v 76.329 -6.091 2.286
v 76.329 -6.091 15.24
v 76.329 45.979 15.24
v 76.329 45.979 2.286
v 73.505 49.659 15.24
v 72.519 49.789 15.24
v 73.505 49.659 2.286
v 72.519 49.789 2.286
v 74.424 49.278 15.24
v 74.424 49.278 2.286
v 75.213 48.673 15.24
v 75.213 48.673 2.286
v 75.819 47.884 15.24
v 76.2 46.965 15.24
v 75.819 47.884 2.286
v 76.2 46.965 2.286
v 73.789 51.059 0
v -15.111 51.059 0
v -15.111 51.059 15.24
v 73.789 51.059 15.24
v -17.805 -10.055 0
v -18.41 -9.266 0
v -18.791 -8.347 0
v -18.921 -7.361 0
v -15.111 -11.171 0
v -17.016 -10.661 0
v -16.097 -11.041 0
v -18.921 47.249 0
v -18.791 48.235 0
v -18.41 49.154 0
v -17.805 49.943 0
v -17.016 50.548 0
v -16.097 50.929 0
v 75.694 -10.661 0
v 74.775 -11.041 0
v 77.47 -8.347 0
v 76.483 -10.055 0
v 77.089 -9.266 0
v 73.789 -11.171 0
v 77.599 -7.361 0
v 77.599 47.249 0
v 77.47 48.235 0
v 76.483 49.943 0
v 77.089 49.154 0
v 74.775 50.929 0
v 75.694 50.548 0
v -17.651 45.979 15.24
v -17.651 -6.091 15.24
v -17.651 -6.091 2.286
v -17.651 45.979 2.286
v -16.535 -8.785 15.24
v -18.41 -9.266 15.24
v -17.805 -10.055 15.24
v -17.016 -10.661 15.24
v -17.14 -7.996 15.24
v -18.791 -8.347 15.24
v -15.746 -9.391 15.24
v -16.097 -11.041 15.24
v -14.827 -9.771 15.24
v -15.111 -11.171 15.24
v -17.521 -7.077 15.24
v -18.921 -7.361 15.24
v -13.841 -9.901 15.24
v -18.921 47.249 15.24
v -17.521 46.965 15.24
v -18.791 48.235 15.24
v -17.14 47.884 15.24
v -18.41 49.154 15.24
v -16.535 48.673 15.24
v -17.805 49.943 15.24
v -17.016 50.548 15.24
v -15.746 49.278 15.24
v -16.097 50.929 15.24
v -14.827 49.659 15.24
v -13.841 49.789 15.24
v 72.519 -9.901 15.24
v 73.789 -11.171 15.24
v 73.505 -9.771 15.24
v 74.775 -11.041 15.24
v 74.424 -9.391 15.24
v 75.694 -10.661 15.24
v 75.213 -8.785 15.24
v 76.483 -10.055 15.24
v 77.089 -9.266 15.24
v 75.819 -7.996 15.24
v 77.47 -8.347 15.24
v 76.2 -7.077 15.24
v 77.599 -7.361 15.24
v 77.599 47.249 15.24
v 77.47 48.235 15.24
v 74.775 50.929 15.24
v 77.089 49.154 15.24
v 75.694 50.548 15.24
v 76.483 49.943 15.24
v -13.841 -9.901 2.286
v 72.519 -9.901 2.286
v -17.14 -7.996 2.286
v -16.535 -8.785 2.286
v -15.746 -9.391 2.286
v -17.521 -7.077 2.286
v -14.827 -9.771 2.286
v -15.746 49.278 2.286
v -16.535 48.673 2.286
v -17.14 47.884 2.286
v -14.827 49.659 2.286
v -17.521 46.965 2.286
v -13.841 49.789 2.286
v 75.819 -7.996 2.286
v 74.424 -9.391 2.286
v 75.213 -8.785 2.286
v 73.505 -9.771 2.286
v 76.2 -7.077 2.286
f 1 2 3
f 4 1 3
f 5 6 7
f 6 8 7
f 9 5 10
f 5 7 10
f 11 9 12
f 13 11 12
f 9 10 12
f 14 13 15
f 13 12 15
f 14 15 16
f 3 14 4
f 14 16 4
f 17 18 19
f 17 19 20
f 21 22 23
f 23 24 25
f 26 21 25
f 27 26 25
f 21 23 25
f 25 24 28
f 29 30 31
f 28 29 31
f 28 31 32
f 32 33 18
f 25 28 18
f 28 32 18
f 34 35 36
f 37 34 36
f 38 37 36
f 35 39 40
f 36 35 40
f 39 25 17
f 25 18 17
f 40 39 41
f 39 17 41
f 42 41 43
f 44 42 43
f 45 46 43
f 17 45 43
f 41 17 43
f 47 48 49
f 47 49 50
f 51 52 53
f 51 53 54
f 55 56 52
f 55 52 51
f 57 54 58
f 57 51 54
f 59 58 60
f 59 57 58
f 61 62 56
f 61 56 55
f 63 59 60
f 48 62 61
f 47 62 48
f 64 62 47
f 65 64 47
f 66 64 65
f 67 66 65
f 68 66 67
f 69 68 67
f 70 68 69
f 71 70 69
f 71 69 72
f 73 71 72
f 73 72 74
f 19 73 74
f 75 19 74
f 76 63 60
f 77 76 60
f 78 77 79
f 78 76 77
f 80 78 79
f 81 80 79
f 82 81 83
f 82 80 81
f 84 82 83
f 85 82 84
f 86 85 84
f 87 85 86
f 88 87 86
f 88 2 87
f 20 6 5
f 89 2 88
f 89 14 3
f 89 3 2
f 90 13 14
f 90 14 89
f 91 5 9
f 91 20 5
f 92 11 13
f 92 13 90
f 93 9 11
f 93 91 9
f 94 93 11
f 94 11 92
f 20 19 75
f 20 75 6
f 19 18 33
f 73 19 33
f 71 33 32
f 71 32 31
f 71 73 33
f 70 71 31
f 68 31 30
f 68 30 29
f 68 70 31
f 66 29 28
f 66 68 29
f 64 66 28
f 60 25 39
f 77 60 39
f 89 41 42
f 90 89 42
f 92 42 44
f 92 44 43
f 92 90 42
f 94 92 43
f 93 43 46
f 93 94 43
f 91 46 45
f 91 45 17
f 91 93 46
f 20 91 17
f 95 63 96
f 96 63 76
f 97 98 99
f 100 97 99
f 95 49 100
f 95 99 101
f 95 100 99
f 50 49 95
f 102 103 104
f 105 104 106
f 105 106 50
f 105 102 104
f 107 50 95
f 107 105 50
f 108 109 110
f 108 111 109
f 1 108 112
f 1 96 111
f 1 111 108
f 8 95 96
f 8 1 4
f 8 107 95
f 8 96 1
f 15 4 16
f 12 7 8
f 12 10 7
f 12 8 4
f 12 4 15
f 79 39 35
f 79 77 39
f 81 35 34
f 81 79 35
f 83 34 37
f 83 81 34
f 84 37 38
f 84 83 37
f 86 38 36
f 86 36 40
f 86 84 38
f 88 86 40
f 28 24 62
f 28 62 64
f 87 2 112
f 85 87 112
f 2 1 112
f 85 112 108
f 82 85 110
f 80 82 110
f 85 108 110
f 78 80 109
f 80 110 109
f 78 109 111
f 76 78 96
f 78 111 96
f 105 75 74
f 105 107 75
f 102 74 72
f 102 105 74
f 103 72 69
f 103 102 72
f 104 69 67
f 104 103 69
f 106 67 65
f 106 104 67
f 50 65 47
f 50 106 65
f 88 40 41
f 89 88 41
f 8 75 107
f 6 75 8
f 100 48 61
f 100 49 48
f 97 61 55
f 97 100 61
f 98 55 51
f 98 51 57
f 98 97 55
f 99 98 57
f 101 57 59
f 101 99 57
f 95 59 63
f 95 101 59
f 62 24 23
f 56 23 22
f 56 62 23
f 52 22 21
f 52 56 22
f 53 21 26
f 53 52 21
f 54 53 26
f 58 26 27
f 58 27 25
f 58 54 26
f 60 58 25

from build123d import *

# Parameters (mm, degrees)
F0_W     = 96.52
F0_H     = 62.23
F1_DEPTH = 15.24
F2_R     = 3.81
F3_R     = 3.81
F4_R     = 3.81
F5_R     = 3.81
F6_W     = 93.98
F6_H     = 59.69
F7_DEPTH = 12.954
F8_R     = 3.81
F9_R     = 3.81


with BuildPart() as f1:
    # F0 (on Top) → F1 (new body)
    with BuildSketch(Plane.XY):
        with Locations((29.339396, 19.943792)):
            Rectangle(F0_W, F0_H)
    extrude(amount=F1_DEPTH)

    # F2
    f2_edges = [f1.edges().sort_by_distance(p)[0] for p in [
        (-18.920604, -11.171208, 7.62),
    ]]
    fillet(f2_edges, radius=F2_R)

    # F3
    f3_edges = [f1.edges().sort_by_distance(p)[0] for p in [
        (77.599396, -11.171208, 7.62),
    ]]
    fillet(f3_edges, radius=F3_R)

    # F4
    f4_edges = [f1.edges().sort_by_distance(p)[0] for p in [
        (77.599396, 51.058792, 7.62),
    ]]
    fillet(f4_edges, radius=F4_R)

    # F5
    f5_edges = [f1.edges().sort_by_distance(p)[0] for p in [
        (-18.920604, 51.058792, 7.62),
    ]]
    fillet(f5_edges, radius=F5_R)

    # F6 (on face) → F7 (cut)
    with BuildSketch(Plane.XY.offset(15.24)):
        with Locations((29.339396, 19.943792)):
            Rectangle(F6_W, F6_H)
    extrude(amount=-F7_DEPTH, mode=Mode.SUBTRACT)

    # F8
    f8_edges = [f1.edges().sort_by_distance(p)[0] for p in [
        (-17.650604, 49.788792, 8.763),
    ]]
    fillet(f8_edges, radius=F8_R)

    # F9
    f9_edges = [f1.edges().sort_by_distance(p)[0] for p in [
        (76.329396, 49.788792, 8.763),
        (-17.650604, -9.901208, 8.763),
        (76.329396, -9.901208, 8.763),
    ]]
    fillet(f9_edges, radius=F9_R)


solid = f1.part
